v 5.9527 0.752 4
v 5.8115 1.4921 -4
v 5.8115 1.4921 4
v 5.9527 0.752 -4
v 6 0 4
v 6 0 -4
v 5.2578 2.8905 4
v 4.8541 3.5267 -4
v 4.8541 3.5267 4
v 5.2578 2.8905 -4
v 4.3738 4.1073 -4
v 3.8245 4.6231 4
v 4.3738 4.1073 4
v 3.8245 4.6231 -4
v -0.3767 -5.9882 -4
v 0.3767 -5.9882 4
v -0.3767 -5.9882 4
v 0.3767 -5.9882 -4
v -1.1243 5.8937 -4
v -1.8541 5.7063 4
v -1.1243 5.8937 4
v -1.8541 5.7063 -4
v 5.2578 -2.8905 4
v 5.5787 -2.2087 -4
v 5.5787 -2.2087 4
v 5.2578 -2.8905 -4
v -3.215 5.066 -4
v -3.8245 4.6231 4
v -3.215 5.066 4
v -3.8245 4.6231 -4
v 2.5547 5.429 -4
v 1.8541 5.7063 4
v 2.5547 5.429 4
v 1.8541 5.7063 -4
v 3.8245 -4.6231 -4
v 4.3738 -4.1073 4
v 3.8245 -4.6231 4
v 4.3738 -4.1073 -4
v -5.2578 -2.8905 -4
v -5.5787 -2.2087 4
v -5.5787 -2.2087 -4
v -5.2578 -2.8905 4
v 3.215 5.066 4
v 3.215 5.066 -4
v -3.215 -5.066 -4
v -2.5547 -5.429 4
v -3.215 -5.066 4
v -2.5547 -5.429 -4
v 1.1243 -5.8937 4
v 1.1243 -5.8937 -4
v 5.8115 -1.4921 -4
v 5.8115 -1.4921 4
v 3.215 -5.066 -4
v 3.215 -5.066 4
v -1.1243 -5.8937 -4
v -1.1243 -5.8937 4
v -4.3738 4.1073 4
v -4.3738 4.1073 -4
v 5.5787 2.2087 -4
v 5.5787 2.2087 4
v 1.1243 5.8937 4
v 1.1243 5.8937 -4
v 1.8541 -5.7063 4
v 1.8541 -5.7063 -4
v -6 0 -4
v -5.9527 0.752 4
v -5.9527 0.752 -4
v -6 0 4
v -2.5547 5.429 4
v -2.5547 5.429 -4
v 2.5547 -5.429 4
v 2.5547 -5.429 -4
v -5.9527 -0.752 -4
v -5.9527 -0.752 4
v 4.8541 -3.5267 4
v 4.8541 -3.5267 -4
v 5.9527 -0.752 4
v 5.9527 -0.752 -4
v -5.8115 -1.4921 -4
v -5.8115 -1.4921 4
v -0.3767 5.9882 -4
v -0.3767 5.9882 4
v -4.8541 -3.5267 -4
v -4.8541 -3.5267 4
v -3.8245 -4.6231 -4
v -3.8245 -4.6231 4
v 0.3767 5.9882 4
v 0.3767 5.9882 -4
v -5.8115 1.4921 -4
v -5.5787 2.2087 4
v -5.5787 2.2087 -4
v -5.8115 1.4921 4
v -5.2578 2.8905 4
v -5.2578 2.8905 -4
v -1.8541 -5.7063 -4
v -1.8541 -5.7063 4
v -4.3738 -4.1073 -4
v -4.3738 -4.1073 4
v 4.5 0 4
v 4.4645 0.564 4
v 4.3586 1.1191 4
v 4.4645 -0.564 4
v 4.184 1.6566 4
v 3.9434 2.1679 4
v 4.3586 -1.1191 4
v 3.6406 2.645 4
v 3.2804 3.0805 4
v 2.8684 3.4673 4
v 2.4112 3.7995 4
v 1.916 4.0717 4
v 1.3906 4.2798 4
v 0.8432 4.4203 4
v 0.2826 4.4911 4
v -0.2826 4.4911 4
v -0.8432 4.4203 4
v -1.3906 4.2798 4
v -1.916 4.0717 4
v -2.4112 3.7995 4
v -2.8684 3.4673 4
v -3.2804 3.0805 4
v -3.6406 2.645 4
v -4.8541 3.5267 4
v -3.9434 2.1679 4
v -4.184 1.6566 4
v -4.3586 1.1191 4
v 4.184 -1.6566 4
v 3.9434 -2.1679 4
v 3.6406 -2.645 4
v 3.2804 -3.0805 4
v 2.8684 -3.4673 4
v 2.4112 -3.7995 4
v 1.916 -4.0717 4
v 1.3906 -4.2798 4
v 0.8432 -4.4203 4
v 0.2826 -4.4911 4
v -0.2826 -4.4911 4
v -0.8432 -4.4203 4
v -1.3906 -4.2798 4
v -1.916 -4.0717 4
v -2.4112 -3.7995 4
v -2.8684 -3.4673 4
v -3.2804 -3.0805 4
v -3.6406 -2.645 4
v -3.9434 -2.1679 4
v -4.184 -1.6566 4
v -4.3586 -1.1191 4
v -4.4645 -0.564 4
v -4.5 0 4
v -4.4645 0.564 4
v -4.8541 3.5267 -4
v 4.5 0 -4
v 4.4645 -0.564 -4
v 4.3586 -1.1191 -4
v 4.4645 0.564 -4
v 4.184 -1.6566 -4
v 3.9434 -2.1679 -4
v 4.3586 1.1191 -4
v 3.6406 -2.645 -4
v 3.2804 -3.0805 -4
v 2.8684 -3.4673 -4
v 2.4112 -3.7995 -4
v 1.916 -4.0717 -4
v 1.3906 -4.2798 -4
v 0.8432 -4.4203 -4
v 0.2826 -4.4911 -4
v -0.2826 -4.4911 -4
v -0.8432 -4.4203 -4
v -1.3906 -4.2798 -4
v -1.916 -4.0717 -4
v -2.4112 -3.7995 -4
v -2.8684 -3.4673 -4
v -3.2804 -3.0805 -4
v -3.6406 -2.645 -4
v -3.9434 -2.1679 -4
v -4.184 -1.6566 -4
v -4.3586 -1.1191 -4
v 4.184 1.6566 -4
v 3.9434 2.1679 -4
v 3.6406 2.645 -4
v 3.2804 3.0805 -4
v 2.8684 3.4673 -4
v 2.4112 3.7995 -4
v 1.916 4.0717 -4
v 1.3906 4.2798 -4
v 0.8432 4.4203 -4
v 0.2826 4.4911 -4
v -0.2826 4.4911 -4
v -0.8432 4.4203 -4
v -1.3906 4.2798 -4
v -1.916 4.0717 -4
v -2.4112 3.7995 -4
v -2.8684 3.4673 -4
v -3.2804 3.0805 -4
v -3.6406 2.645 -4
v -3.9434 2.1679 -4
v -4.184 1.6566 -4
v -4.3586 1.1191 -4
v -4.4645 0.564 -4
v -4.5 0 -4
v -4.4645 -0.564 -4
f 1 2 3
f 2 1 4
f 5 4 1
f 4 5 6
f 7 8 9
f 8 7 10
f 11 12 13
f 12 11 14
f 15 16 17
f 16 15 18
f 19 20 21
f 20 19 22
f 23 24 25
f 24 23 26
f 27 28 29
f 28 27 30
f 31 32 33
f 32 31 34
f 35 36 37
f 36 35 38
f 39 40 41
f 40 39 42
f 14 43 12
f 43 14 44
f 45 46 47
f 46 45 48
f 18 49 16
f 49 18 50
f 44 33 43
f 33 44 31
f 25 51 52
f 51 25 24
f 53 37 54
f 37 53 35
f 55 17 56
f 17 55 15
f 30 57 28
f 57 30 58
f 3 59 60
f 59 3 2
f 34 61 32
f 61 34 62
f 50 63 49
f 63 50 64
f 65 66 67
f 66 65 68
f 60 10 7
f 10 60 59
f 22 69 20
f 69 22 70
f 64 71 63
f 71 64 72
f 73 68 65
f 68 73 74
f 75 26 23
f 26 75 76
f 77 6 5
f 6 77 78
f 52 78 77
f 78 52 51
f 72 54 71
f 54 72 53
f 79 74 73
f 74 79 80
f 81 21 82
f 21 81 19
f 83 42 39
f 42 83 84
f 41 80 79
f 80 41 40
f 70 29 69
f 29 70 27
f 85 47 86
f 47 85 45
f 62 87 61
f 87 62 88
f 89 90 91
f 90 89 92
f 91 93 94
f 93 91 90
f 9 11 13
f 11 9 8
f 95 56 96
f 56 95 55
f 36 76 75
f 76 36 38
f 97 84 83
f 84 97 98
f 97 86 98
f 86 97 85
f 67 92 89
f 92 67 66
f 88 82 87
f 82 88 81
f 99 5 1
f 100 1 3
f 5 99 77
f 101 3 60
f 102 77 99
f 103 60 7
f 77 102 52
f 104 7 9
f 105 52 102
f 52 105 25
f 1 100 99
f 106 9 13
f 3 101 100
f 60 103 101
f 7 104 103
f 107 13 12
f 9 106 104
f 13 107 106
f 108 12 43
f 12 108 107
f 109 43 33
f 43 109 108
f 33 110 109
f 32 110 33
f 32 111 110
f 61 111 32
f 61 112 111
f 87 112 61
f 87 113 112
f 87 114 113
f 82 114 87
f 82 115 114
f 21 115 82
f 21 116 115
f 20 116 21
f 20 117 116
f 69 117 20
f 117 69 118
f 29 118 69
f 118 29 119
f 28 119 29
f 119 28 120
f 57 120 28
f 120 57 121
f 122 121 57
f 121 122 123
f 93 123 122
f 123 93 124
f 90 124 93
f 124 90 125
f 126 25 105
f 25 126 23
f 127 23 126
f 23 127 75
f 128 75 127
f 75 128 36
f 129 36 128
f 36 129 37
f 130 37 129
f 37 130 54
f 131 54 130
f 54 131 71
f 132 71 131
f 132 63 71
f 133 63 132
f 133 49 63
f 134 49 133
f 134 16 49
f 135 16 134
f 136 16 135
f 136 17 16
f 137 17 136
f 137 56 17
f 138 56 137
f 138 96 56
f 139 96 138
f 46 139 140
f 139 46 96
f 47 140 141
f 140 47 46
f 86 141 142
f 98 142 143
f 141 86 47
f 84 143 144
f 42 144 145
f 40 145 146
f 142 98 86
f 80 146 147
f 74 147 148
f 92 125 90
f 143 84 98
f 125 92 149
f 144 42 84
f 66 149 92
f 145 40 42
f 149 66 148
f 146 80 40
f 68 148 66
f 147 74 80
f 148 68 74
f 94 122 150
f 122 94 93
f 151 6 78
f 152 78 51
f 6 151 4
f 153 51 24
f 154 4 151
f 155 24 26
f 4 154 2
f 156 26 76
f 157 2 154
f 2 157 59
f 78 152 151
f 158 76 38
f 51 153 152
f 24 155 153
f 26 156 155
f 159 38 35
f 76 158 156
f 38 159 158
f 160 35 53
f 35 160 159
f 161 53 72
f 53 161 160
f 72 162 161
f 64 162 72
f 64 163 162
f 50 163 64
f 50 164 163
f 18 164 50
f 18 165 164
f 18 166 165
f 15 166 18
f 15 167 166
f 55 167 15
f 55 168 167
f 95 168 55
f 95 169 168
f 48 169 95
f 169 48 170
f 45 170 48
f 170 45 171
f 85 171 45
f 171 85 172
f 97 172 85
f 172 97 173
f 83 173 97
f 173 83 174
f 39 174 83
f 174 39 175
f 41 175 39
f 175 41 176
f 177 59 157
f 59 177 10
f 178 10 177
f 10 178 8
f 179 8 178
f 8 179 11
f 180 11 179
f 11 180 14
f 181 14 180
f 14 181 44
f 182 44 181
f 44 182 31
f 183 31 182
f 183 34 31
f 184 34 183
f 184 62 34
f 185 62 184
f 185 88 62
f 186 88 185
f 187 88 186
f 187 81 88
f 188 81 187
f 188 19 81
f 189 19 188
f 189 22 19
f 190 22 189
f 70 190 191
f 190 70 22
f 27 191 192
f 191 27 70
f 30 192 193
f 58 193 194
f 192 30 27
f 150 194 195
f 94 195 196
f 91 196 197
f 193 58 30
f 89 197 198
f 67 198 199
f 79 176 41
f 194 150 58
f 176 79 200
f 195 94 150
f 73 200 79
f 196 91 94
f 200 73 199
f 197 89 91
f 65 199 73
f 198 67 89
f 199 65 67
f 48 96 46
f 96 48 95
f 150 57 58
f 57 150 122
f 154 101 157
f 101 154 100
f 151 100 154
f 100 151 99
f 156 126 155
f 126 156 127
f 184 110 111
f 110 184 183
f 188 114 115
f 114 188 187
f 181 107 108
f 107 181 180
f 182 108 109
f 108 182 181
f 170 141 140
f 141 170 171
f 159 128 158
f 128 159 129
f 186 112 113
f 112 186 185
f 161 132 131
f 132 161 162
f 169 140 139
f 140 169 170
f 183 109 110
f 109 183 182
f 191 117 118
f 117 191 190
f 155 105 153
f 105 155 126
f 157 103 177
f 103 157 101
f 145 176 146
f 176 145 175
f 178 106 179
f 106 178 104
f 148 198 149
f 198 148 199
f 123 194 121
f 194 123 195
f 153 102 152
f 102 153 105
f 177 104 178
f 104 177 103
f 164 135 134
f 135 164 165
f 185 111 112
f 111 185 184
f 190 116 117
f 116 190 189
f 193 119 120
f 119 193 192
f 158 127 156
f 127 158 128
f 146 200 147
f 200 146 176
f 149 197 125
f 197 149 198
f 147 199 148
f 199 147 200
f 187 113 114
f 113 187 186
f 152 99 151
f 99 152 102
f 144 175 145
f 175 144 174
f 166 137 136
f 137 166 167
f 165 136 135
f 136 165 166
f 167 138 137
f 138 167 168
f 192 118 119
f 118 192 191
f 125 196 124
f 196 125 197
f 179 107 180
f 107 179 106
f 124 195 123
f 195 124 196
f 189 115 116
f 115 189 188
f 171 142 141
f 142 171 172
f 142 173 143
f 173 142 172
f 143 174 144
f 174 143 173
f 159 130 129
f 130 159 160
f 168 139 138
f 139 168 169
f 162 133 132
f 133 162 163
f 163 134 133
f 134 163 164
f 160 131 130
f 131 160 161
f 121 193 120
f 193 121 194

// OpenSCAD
$fn = 50;


difference() {
	union() {
		translate(v = [0, 0, -4.0000000000]) {
			cylinder(h = 8, r = 6.0000000000);
		}
	}
	union() {
		translate(v = [0, 0, -100.0000000000]) {
			cylinder(h = 200, r = 4.5000000000);
		}
	}
}
